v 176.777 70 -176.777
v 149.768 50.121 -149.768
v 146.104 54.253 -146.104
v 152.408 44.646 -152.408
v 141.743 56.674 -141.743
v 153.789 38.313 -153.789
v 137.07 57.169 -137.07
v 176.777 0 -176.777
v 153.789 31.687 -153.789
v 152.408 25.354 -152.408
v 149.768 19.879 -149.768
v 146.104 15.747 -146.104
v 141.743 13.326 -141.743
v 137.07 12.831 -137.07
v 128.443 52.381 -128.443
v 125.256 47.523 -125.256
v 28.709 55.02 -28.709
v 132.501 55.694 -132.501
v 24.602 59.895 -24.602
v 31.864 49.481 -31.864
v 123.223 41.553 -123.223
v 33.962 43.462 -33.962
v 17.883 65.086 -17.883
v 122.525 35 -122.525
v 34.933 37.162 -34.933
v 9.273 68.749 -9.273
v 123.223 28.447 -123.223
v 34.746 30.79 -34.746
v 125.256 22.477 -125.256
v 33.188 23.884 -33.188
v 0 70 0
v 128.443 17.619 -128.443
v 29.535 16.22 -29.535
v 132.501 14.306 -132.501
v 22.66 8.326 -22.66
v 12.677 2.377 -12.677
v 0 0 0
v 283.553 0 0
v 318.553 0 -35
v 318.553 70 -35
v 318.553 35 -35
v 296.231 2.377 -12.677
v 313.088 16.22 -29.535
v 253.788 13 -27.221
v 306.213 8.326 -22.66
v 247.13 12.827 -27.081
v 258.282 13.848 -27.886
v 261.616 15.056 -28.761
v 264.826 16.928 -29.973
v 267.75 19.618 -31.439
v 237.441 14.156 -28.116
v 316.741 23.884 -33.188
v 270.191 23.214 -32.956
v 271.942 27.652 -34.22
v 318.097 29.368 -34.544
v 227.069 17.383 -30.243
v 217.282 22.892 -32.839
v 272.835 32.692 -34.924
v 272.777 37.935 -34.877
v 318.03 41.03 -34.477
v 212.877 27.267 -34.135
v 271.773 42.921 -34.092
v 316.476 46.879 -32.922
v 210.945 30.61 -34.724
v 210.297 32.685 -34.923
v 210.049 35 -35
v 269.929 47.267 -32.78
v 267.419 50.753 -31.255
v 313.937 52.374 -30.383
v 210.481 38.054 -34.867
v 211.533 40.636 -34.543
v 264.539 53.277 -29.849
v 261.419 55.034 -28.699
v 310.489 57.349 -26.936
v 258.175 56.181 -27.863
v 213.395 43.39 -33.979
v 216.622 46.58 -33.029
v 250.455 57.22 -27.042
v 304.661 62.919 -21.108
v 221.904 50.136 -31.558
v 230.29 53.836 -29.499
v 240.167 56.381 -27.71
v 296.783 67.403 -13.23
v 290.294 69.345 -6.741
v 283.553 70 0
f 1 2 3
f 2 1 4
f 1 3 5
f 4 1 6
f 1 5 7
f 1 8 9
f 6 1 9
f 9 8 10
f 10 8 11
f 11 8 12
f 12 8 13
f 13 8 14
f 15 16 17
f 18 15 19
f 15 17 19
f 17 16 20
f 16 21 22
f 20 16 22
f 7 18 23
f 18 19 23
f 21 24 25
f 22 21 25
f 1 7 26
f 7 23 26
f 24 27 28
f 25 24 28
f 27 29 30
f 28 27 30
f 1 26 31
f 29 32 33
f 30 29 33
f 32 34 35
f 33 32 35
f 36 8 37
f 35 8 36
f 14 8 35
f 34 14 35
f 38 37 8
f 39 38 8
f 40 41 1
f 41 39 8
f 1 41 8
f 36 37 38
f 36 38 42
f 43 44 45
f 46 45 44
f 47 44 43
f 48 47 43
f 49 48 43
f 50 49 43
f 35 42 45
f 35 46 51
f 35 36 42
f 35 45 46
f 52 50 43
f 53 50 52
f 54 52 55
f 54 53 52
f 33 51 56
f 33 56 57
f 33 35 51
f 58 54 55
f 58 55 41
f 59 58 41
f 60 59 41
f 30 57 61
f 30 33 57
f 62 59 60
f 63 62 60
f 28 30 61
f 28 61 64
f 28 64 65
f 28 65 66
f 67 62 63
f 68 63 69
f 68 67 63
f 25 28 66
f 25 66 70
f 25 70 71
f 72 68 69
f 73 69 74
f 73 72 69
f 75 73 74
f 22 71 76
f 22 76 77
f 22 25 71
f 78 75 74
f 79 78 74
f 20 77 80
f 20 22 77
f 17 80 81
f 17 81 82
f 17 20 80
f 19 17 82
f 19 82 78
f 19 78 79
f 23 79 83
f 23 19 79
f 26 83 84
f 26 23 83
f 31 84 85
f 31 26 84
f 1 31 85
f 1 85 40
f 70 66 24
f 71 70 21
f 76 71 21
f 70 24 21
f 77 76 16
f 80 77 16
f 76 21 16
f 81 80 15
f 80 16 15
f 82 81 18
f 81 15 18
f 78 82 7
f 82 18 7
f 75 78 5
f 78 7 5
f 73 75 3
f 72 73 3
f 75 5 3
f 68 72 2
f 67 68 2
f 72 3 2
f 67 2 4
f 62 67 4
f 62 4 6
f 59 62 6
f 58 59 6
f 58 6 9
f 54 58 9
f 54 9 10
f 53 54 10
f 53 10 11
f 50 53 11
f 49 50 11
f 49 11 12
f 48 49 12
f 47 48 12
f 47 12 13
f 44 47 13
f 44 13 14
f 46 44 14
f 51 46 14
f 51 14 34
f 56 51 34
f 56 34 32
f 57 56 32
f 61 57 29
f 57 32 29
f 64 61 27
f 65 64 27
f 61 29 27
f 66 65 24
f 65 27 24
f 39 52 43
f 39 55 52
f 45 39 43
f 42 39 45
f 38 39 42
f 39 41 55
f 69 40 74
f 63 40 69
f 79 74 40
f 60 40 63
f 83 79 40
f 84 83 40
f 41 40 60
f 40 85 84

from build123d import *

# Parameters (mm, degrees)
BOSS_EXTRUDE1_DEPTH = 70
CUT_EXTRUDE1_DEPTH  = 402
CUT_EXTRUDE3_DEPTH  = 164
SKETCH5_R           = 22.231226606
CUT_EXTRUDE4_DEPTH  = 251


with BuildPart() as part:
    # Sketch1 → Boss-Extrude1 (new body)
    with BuildSketch(Plane(origin=(0, 0, 0), x_dir=(1, 0, 0), z_dir=(0, 1, 0))):
        Polygon((0, 0), (353.553390593, 0), (176.776695297, 176.776695297), align=None)
    extrude(amount=BOSS_EXTRUDE1_DEPTH)

    # Sketch3 → Cut-Extrude1 (cut)
    with BuildSketch(Plane(origin=(0, 0, 0), x_dir=(0, 0, -1), z_dir=(1, 0, 0))):
        with BuildLine():
            Line((0, 70), (0, 0))
            ThreePointArc((0, 0), (35, 35), (0, 70))
        make_face()
    extrude(amount=CUT_EXTRUDE1_DEPTH, mode=Mode.SUBTRACT)

    # Sketch4 → Cut-Extrude3 (cut)
    with BuildSketch(Plane.XZ):
        Polygon((318.553390593, -35), (283.553390593, 0), (353.553390593, 0), align=None)
    extrude(amount=-CUT_EXTRUDE3_DEPTH, mode=Mode.SUBTRACT)

    # Sketch5 → Cut-Extrude4 (cut)
    with BuildSketch(Plane(origin=(0, 0, 0), x_dir=(-0.7071067811865462, 0, 0.7071067811865489), z_dir=(-0.7071067811865489, 0, -0.7071067811865462))):
        with Locations((-195.507283553, 35)):
            Circle(SKETCH5_R)
    extrude(amount=-CUT_EXTRUDE4_DEPTH, mode=Mode.SUBTRACT)


solid = part.part
